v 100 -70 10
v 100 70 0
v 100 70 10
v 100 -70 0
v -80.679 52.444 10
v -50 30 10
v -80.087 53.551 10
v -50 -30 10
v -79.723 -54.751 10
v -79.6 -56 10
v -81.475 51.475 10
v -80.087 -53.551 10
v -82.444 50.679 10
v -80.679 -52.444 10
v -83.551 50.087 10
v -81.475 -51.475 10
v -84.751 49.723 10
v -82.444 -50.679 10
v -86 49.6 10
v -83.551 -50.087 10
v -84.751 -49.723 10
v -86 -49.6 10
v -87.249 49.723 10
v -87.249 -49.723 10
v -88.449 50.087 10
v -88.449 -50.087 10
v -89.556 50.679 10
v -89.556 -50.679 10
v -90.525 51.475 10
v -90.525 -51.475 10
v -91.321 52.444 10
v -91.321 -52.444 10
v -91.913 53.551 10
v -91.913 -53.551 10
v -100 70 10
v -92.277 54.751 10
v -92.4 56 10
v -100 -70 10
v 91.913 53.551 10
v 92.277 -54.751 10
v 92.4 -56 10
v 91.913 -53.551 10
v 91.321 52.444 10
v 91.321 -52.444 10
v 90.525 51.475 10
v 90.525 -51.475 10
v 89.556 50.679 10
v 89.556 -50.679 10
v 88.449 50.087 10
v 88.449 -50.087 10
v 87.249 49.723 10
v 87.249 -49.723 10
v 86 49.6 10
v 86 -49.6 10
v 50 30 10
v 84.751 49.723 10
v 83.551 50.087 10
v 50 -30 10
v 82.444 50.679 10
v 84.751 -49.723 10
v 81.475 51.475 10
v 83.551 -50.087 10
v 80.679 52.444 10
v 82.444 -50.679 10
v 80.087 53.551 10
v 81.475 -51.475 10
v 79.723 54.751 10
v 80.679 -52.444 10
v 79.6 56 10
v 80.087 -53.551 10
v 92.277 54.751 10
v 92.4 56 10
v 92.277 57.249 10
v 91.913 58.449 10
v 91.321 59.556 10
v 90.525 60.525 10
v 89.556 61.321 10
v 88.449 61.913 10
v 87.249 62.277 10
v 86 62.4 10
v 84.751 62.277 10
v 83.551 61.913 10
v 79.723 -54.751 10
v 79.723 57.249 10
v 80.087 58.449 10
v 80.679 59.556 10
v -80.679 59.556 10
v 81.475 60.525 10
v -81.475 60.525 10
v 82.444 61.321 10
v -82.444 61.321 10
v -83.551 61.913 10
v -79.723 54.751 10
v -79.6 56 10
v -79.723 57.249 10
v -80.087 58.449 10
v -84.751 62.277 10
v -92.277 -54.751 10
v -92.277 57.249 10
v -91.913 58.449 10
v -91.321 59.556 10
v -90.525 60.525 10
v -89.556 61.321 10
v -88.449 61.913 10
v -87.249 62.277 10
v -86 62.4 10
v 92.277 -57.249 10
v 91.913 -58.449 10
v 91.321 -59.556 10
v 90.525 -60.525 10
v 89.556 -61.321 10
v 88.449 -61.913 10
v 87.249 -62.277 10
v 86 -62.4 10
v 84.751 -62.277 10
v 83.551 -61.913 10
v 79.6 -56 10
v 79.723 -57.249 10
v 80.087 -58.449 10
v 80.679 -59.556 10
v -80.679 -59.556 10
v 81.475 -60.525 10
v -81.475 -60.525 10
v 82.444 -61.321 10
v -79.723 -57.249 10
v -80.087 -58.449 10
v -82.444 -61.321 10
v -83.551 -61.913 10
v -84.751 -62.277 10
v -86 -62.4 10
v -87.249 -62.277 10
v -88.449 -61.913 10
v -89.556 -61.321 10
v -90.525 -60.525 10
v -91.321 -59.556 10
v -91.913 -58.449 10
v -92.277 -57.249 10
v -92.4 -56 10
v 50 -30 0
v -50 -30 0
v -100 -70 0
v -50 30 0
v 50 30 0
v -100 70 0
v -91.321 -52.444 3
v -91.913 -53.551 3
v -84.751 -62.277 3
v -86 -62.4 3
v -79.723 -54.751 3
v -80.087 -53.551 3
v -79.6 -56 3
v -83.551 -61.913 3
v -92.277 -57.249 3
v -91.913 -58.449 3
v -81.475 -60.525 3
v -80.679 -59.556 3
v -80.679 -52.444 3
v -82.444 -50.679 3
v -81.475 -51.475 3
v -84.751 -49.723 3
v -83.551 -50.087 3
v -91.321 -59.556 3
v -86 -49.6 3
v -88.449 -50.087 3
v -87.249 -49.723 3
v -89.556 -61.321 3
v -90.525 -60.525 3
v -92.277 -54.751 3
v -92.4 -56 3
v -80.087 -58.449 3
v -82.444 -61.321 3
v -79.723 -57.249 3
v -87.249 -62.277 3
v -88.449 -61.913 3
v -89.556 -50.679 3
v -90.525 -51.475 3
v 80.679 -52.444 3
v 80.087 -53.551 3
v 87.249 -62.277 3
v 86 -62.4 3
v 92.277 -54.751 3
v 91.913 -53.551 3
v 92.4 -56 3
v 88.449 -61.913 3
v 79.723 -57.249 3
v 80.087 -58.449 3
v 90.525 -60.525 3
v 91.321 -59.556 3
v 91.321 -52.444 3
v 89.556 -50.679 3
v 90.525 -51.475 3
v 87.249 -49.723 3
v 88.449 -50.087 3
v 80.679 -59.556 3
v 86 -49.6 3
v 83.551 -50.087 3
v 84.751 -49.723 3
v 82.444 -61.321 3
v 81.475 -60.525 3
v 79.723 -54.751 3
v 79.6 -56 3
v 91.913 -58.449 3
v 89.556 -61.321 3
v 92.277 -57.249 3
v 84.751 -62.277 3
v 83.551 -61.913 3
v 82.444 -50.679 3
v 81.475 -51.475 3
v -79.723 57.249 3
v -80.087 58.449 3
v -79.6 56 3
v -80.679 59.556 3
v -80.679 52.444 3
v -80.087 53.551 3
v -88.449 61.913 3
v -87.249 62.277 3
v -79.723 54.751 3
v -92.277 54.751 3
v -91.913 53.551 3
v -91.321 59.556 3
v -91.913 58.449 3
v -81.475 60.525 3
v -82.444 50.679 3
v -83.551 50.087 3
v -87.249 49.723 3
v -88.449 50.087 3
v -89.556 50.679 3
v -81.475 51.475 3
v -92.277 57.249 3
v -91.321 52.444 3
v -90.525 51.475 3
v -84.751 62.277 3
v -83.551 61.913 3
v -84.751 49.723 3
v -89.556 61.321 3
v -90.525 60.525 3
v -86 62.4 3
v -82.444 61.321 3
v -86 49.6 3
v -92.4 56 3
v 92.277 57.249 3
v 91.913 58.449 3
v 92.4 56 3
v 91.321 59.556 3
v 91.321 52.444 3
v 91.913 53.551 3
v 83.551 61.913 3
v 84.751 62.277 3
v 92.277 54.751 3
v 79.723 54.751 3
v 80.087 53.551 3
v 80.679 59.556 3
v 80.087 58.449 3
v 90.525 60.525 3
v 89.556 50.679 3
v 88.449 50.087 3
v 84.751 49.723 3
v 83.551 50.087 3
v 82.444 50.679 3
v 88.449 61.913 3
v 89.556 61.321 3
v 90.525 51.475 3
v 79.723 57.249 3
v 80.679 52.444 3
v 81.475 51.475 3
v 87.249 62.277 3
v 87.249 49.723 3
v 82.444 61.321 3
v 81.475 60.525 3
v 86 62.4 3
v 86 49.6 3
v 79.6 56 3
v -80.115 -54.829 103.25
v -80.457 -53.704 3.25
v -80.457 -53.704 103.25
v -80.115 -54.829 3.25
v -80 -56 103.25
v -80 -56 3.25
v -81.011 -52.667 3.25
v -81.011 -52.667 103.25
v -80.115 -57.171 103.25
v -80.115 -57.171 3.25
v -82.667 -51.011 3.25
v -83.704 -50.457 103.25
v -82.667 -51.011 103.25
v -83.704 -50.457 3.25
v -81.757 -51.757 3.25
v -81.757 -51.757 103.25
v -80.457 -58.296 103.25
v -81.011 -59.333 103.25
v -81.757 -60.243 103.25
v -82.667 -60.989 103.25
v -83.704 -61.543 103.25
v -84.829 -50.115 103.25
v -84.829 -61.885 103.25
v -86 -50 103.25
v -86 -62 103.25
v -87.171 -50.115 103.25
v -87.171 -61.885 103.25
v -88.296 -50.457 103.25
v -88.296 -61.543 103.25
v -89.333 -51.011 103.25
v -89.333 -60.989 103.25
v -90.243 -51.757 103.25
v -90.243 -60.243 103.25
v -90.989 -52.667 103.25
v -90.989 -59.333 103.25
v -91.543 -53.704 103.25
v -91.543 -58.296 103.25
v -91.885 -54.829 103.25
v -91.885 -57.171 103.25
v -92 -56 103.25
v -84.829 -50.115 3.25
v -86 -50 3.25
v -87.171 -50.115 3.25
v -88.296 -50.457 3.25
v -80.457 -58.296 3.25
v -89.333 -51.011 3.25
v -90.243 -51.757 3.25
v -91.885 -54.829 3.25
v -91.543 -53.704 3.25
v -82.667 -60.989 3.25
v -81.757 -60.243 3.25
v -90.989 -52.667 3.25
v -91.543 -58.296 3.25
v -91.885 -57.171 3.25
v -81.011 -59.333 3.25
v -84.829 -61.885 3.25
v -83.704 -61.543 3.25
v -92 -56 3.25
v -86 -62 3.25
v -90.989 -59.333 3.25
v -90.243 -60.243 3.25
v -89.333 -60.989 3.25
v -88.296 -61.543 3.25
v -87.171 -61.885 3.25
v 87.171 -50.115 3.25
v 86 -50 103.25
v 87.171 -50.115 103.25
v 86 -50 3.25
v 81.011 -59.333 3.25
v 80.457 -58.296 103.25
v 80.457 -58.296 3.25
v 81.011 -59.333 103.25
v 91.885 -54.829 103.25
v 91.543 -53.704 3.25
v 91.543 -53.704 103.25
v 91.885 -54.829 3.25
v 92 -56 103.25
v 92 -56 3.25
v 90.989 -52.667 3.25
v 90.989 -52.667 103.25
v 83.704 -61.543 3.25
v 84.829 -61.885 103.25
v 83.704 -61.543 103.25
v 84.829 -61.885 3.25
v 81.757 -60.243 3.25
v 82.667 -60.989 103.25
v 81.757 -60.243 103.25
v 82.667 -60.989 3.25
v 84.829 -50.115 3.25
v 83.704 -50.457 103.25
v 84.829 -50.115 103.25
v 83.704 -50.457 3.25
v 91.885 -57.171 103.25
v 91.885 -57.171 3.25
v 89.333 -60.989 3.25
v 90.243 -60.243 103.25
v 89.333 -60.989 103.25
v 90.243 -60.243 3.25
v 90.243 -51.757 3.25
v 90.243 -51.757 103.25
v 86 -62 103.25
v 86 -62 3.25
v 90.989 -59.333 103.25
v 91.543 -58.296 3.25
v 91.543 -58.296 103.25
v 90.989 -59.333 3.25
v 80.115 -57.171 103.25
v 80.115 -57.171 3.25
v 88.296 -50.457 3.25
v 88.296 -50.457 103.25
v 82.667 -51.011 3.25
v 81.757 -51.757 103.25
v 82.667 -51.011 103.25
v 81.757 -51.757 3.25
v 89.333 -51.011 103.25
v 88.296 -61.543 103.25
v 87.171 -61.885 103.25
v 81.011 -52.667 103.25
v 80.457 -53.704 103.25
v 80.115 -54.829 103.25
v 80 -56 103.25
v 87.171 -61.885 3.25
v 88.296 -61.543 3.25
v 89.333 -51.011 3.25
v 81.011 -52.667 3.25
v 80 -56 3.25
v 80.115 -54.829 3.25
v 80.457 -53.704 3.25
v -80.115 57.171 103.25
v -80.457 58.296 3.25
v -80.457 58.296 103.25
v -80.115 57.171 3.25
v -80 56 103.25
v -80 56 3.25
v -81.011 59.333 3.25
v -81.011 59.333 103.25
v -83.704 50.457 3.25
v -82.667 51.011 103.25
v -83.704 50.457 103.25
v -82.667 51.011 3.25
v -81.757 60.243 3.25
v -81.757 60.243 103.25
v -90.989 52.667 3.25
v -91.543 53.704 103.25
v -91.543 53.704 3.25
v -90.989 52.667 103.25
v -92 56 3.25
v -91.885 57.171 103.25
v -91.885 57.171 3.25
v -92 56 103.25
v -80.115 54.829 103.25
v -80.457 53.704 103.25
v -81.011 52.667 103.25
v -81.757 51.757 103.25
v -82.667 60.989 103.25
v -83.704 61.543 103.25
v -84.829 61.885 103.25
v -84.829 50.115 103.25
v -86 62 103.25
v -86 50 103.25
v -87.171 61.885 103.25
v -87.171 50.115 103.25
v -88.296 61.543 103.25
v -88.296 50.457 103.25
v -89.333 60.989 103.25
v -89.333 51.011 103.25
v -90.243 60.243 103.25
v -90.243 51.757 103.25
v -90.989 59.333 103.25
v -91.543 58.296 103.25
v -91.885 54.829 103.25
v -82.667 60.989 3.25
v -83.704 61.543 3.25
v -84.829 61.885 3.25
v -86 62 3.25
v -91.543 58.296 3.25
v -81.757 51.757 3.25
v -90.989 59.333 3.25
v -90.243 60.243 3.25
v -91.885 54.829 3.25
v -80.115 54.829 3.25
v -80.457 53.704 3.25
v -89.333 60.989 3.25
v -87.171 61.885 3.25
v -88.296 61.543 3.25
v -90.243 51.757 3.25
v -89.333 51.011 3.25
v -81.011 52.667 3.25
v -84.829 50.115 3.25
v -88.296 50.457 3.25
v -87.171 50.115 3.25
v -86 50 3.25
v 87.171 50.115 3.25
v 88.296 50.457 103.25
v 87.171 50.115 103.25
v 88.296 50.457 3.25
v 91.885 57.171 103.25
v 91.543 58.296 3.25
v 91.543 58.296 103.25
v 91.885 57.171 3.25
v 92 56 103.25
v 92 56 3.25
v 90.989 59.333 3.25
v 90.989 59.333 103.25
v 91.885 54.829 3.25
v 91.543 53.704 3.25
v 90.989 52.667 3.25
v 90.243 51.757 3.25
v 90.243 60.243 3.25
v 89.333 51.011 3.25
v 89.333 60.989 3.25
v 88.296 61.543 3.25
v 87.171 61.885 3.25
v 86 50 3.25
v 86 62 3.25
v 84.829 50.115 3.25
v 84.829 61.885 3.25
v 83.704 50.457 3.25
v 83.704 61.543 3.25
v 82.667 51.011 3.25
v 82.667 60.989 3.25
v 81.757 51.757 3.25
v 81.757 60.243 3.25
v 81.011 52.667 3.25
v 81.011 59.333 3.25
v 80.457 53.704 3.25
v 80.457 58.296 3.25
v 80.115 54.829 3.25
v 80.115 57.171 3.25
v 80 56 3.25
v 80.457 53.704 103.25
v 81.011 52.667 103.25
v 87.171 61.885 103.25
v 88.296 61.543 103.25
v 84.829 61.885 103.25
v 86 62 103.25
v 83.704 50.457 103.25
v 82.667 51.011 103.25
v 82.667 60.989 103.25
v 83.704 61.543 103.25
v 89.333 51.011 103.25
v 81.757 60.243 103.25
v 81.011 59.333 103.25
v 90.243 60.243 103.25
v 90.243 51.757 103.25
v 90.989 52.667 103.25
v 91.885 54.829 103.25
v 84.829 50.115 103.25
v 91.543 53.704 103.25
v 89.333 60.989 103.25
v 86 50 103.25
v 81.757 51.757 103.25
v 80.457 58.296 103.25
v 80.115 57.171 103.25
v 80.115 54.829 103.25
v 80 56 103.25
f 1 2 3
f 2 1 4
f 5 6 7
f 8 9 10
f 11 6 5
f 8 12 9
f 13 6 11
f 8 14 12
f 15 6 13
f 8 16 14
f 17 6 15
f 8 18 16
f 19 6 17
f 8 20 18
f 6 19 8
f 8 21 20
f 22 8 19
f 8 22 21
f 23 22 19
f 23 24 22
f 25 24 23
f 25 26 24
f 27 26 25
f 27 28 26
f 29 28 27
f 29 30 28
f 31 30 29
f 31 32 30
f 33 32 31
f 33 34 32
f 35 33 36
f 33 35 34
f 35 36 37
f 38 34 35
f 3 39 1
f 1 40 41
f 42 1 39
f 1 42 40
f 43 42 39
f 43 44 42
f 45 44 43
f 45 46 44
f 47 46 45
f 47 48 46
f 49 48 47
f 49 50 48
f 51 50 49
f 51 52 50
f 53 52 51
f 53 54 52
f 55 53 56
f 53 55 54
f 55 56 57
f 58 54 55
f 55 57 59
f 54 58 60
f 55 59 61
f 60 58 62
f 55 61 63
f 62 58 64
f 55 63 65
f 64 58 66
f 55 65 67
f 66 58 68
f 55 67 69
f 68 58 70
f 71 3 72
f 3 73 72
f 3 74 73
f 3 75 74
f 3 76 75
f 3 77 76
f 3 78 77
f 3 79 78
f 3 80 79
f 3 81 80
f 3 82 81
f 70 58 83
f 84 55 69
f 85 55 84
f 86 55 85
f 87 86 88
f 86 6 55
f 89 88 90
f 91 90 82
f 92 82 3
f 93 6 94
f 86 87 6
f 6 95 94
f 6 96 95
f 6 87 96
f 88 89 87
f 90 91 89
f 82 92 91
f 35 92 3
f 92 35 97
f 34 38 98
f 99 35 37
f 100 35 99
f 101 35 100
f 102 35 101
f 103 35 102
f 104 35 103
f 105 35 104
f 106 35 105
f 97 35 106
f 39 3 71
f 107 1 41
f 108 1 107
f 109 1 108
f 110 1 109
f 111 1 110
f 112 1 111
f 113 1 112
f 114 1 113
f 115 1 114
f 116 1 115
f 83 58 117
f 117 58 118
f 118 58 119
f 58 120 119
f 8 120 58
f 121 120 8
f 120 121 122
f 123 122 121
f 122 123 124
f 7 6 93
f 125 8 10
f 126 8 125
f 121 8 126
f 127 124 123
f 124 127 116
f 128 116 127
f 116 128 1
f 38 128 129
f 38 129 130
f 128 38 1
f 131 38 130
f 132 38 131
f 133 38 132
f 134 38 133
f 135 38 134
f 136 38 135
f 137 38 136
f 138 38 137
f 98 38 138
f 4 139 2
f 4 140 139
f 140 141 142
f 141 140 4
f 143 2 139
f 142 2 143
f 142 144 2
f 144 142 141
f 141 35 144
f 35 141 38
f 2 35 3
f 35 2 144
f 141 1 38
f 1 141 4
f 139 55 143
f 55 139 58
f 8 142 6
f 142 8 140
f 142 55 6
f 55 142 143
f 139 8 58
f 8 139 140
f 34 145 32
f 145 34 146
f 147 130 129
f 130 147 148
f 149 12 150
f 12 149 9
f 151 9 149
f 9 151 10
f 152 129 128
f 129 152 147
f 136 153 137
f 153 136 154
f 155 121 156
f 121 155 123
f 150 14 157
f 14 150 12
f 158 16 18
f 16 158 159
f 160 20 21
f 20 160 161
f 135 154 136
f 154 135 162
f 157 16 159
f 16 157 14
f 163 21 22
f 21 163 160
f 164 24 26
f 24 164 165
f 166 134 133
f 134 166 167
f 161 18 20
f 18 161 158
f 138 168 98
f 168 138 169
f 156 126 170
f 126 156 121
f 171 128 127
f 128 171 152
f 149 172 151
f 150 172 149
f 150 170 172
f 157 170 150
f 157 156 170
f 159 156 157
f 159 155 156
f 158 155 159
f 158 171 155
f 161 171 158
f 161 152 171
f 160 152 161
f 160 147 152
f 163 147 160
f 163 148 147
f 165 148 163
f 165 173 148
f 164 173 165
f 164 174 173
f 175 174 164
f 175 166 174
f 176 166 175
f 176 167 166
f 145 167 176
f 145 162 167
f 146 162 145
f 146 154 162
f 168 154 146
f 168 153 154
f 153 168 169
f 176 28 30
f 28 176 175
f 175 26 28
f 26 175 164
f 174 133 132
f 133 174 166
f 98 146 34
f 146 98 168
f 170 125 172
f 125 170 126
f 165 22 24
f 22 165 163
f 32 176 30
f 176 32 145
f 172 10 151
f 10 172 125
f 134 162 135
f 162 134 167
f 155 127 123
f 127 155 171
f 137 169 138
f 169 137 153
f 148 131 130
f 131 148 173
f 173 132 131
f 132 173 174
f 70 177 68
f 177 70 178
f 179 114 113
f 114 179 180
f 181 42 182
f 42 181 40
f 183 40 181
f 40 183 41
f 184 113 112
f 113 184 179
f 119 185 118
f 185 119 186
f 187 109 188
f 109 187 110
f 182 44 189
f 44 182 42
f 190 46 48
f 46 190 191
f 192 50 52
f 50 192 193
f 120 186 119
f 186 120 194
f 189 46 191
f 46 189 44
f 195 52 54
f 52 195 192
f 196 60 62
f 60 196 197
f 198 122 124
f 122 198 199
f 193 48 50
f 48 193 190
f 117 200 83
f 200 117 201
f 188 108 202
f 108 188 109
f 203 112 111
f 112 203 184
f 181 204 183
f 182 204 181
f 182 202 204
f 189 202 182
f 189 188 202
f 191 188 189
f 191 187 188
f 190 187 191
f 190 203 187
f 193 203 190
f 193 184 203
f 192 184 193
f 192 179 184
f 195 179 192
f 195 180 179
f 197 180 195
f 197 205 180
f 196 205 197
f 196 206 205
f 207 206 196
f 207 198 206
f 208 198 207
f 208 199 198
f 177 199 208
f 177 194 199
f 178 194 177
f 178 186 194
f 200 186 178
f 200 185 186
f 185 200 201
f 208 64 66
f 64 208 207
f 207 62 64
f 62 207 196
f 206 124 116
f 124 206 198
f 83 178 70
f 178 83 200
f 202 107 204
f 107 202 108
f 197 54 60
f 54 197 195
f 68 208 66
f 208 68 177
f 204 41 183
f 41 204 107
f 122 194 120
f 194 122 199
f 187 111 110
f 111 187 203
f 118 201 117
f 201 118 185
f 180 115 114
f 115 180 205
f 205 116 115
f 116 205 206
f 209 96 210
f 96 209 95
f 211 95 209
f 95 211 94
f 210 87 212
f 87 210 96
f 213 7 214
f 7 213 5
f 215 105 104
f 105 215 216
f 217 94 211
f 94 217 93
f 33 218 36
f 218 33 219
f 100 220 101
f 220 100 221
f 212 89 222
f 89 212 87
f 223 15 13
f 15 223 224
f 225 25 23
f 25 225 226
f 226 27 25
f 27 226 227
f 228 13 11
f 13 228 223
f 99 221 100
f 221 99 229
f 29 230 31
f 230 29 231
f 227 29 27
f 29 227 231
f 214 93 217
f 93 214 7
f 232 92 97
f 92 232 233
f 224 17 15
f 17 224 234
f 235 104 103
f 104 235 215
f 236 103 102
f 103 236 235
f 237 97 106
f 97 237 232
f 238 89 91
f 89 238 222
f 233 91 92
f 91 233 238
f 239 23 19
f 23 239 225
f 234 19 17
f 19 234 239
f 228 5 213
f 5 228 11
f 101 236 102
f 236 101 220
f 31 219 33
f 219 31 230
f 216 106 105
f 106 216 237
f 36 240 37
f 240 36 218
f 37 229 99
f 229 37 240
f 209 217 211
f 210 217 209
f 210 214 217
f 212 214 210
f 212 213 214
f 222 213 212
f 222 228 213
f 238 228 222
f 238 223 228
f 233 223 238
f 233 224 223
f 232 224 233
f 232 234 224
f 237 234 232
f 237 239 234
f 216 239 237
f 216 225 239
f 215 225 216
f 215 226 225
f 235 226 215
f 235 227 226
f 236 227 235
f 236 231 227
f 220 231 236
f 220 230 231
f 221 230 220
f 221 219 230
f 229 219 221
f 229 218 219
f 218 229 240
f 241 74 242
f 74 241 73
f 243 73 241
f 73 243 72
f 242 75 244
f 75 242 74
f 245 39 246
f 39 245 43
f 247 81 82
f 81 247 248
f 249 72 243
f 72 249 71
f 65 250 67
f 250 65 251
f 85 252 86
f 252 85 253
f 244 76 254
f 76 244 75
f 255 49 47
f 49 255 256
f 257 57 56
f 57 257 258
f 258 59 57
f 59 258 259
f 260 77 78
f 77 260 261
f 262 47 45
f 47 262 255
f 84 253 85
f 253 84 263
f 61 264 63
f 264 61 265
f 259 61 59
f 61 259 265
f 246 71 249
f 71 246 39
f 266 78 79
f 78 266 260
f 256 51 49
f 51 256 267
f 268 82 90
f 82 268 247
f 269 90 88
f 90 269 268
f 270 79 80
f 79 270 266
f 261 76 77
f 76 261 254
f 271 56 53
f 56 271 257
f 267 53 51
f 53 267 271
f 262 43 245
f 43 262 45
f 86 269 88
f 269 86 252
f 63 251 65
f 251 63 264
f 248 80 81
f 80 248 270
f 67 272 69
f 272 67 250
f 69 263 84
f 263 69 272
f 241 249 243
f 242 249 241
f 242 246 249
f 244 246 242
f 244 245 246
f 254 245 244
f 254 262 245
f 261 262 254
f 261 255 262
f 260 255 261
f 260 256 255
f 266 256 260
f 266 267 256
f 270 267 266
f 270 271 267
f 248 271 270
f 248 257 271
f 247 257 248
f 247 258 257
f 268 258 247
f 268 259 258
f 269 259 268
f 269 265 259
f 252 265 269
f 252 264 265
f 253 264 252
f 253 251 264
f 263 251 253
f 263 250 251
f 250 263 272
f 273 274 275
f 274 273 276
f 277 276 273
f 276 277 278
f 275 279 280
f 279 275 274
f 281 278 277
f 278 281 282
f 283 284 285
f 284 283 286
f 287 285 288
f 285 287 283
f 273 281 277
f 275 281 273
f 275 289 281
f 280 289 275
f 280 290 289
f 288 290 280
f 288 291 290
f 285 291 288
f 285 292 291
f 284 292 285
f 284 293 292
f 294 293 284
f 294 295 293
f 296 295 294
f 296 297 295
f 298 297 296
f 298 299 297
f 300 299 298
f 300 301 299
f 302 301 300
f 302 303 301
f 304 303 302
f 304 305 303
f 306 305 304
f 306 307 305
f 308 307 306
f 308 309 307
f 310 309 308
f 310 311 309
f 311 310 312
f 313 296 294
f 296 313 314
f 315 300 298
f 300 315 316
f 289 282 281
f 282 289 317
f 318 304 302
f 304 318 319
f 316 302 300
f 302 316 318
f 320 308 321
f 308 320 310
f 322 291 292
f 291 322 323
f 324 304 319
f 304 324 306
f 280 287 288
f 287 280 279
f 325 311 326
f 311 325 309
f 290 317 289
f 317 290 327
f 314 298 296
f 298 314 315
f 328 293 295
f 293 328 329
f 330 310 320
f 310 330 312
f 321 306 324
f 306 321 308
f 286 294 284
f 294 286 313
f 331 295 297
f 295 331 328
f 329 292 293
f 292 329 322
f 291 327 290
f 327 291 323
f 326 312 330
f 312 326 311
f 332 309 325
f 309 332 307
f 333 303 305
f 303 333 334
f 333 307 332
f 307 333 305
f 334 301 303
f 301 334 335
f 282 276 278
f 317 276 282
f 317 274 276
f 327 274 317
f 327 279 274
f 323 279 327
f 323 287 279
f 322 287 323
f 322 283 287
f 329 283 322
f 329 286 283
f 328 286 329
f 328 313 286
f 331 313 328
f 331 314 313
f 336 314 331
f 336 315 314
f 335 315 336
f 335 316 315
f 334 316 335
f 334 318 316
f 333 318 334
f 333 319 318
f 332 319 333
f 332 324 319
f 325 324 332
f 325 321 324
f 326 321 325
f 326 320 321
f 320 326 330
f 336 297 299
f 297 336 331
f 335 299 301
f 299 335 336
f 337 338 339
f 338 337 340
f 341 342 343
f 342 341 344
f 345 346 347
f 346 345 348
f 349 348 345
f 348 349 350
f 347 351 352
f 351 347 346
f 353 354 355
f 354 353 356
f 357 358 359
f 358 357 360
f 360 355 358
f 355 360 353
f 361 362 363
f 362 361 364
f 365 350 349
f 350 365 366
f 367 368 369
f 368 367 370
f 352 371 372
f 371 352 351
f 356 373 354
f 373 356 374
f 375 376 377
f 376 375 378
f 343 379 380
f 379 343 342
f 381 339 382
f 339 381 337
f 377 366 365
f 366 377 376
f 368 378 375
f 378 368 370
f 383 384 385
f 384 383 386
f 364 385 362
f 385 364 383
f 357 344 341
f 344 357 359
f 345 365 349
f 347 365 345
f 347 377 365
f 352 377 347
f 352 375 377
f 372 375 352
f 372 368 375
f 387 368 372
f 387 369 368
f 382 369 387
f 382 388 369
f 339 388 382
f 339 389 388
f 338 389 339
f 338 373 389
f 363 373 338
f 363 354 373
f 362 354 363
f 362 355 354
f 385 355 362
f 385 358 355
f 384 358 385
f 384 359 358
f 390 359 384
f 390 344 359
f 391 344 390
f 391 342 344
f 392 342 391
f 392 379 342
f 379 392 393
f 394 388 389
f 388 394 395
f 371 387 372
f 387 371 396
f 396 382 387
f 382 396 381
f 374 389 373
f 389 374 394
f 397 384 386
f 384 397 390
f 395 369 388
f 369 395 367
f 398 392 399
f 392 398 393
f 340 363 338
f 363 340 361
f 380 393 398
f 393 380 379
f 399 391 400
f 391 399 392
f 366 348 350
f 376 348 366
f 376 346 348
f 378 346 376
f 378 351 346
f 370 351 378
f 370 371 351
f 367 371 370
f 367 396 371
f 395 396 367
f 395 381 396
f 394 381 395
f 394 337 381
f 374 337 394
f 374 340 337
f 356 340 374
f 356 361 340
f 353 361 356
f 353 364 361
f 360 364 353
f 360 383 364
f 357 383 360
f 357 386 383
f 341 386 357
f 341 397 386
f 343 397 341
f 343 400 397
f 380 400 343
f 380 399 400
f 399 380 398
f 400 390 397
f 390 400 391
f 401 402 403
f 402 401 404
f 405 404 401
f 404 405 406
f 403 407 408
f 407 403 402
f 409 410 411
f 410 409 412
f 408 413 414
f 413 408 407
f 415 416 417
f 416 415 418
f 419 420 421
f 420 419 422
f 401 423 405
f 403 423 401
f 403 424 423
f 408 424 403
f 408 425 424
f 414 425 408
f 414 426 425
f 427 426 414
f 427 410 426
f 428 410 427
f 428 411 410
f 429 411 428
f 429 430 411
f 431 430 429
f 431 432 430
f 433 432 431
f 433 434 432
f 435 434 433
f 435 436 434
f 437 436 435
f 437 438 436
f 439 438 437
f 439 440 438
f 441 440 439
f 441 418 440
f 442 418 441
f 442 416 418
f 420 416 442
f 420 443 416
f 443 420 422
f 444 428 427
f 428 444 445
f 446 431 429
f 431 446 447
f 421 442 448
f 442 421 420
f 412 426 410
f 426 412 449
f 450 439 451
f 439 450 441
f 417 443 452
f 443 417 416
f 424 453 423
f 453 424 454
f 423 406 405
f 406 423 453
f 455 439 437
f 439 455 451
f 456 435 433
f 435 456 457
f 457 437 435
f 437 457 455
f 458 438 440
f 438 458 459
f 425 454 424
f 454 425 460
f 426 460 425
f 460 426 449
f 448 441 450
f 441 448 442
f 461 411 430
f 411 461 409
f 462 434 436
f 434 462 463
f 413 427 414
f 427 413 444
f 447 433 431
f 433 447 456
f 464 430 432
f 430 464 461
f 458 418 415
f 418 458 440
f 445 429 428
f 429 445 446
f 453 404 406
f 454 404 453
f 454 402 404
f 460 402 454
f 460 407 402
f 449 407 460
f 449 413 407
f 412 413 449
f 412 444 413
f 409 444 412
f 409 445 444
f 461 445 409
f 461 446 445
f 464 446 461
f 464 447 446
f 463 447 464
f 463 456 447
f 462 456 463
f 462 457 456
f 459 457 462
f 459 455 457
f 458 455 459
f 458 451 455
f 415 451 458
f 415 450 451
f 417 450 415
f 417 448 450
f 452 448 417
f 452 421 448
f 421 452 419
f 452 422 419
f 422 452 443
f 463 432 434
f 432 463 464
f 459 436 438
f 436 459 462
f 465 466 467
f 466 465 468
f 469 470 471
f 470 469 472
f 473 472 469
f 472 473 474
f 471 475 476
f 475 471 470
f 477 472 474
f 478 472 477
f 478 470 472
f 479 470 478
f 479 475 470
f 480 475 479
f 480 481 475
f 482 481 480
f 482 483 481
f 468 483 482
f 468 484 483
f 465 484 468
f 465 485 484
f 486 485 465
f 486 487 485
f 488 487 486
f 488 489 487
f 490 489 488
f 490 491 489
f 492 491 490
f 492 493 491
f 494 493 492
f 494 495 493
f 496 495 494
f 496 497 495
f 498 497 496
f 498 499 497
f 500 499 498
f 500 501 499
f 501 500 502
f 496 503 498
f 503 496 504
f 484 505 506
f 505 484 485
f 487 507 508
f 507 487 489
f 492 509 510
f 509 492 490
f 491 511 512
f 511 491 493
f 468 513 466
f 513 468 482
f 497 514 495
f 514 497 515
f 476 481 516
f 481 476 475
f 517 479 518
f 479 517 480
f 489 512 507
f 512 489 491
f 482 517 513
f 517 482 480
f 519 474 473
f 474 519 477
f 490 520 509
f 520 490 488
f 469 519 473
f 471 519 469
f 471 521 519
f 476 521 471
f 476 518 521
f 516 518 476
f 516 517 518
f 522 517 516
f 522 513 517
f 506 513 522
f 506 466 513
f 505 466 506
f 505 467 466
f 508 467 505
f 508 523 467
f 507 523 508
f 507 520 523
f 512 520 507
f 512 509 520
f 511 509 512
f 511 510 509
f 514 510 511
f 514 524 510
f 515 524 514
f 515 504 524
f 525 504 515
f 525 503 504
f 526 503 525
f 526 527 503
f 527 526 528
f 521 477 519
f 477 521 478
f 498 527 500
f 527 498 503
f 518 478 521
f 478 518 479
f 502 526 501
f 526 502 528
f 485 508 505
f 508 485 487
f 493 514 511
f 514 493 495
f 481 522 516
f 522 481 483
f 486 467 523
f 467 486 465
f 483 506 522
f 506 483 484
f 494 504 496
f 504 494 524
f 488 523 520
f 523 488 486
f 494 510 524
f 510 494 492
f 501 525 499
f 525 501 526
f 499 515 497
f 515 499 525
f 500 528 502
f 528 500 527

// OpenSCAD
$fn = 32;

// ------------------------------------------------------------------------
// Frame with four posts: 200 x 140 mm frame, four d12 posts
// Every part is its own module, assembly() places them once.
// ------------------------------------------------------------------------

// --- part 1 ---
module base_frame() {
  difference() {
    translate([-100, -70, 0]) cube([200, 140, 10]);
    translate([-50, -30, -1]) cube([100, 60, 12]);
    translate([-86, -56, 3]) cylinder(h = 8, d = 12.8);
    translate([86, -56, 3]) cylinder(h = 8, d = 12.8);
    translate([-86, 56, 3]) cylinder(h = 8, d = 12.8);
    translate([86, 56, 3]) cylinder(h = 8, d = 12.8);
  }
}

// --- part 2 ---
module post1() {
  cylinder(h = 100, d = 12);
}

// --- part 3 ---
module post2() {
  cylinder(h = 100, d = 12);
}

// --- part 4 ---
module post3() {
  cylinder(h = 100, d = 12);
}

// --- part 5 ---
module post4() {
  cylinder(h = 100, d = 12);
}

// --- assembly ---
module assembly() {
  translate([0, 0, 0]) rotate([0, 0, 0]) base_frame();
  translate([-86, -56, 3.25]) rotate([0, 0, 0]) post1();
  translate([86, -56, 3.25]) rotate([0, 0, 0]) post2();
  translate([-86, 56, 3.25]) rotate([0, 0, 0]) post3();
  translate([86, 56, 3.25]) rotate([0, 0, 0]) post4();
}

assembly();
